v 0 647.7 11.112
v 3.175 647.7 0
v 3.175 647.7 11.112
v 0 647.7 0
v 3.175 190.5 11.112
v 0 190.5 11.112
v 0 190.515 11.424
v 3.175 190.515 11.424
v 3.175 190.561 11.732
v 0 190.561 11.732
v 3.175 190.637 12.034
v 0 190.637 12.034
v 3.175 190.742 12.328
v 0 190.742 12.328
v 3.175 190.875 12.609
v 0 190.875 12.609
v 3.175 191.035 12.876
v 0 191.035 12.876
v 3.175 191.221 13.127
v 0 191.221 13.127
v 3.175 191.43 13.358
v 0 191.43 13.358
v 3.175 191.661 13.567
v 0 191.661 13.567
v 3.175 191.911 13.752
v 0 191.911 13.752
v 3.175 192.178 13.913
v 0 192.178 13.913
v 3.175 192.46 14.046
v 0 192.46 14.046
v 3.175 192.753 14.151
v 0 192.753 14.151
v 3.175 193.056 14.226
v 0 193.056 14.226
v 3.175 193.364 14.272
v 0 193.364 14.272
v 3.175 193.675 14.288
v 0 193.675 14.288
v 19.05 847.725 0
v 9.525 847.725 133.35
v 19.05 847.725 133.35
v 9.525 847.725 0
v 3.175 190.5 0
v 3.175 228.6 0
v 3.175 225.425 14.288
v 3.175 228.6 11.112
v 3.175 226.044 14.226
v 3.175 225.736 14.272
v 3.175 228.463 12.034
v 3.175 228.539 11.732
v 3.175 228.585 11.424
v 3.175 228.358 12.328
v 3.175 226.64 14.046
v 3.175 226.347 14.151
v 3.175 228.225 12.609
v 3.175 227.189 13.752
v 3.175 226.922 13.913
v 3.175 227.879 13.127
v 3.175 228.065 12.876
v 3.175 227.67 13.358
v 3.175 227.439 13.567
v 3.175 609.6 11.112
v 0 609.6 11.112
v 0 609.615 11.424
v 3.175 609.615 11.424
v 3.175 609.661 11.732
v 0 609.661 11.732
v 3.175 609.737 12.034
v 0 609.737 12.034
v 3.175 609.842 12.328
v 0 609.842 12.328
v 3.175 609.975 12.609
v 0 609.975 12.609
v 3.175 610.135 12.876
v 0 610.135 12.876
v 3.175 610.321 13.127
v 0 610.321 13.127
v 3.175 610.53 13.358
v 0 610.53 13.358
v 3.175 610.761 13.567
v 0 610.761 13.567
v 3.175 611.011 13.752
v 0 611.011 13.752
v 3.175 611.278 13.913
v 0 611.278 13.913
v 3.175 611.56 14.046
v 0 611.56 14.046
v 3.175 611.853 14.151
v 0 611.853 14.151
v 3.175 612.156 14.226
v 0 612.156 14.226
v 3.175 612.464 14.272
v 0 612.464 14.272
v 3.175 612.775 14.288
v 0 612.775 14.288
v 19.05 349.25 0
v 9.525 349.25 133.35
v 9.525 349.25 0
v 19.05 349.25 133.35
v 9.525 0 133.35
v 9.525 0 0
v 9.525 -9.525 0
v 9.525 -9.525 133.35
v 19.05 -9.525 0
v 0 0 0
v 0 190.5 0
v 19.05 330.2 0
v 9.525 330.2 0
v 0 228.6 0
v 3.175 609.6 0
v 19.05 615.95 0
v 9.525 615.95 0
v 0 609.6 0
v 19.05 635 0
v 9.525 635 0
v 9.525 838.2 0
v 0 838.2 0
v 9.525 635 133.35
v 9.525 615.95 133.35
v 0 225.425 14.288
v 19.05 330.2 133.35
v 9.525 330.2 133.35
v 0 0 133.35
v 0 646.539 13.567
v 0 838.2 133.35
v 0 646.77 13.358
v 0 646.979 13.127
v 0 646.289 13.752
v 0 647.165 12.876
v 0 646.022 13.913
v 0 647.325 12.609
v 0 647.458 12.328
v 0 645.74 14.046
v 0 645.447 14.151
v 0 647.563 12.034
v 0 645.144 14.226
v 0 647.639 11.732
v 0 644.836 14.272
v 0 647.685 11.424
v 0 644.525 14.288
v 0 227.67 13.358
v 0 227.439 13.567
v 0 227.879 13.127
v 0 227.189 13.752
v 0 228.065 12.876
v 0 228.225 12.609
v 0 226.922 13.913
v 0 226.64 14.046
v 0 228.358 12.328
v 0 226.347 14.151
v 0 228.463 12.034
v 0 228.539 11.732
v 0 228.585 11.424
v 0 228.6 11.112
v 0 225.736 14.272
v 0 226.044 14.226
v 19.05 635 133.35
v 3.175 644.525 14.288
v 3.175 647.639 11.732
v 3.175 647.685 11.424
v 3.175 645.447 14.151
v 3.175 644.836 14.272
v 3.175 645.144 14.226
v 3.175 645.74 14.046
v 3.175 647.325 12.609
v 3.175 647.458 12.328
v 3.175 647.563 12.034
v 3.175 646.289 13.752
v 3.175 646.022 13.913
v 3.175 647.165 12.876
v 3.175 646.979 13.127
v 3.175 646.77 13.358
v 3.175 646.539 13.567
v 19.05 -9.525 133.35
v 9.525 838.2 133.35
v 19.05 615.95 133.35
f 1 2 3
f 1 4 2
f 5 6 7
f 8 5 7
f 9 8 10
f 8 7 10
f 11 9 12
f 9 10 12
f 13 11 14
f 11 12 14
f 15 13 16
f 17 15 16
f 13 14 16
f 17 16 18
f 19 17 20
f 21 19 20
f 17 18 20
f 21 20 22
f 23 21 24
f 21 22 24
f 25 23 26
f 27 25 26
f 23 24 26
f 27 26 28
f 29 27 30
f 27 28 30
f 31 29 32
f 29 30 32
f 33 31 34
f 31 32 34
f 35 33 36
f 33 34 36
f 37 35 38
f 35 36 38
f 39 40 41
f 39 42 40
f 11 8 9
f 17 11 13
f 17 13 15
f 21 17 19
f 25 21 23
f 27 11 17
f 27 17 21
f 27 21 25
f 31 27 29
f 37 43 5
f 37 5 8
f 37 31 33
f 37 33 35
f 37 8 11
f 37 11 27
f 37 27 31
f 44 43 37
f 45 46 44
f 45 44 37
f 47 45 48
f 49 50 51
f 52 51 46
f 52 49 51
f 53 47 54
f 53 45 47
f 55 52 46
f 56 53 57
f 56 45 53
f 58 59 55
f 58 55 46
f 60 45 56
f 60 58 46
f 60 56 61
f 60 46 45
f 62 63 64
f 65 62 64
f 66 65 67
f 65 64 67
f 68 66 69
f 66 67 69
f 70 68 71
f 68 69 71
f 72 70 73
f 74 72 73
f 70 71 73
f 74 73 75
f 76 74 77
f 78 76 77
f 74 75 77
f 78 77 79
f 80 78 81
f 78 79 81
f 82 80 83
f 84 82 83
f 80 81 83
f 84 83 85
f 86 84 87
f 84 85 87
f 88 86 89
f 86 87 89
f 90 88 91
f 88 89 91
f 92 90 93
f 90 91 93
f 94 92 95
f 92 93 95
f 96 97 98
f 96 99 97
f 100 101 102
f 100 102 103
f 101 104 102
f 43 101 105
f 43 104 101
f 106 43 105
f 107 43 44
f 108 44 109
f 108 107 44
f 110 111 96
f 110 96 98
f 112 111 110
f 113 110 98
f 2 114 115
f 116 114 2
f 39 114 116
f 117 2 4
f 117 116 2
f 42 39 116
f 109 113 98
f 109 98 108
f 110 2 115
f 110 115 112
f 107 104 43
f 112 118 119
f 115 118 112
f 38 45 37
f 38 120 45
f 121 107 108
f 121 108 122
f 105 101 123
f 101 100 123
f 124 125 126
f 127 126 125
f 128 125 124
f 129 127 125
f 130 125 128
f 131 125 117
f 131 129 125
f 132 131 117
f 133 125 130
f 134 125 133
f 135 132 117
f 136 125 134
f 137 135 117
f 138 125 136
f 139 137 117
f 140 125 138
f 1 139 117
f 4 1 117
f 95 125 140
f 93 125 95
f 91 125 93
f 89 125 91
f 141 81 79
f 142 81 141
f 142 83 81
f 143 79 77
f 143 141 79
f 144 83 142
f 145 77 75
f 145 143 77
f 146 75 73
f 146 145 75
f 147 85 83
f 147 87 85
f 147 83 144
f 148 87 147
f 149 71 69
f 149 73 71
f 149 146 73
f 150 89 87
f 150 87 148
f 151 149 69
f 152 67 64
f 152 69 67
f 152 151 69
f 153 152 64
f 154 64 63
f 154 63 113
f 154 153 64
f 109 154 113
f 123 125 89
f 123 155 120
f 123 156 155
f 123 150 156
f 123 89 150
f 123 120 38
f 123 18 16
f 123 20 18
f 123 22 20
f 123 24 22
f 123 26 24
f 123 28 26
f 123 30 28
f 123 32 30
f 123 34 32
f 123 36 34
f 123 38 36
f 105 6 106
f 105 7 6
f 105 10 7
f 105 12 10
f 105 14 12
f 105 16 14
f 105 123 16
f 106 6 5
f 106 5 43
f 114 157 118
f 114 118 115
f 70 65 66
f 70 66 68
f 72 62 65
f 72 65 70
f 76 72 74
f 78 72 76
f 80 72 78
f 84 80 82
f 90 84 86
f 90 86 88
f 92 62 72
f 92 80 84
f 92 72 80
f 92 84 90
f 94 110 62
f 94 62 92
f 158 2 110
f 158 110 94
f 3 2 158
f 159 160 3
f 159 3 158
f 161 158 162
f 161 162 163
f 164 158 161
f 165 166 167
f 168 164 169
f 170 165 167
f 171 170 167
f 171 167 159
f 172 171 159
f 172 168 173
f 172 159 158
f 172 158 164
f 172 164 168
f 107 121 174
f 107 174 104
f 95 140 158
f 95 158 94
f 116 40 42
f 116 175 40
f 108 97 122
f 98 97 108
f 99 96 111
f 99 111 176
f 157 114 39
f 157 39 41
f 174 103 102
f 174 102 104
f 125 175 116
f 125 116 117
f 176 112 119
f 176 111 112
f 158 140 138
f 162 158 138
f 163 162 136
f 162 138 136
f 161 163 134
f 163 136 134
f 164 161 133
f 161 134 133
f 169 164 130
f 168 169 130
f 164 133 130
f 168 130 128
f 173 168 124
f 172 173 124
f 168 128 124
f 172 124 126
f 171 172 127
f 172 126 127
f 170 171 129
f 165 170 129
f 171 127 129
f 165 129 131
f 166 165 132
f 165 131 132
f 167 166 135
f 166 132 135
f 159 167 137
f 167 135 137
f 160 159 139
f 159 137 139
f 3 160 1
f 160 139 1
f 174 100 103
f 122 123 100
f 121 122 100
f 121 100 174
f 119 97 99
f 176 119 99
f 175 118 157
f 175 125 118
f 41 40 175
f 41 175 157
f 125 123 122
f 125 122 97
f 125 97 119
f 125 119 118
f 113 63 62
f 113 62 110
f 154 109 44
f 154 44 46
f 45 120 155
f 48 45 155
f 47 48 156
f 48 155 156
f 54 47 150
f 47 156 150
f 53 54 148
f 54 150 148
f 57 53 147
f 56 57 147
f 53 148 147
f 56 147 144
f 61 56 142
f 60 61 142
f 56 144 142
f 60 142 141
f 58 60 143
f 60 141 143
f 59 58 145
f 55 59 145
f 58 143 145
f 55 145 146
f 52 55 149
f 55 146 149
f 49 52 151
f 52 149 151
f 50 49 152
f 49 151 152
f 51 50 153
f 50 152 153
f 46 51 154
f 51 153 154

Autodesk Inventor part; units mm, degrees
ref_plane "YZ Plane" through (0, 0, 0) normal (1, 0, 0) x (0, 1, 0)
ref_plane "XZ Plane" through (0, 0, 0) normal (0, 1, 0) x (-1, 0, 0)
ref_plane "XY Plane" through (0, 0, 0) normal (0, 0, 1) x (1, 0, 0)
sketch "Sketch1" plane through (0, 0, 0) normal (0, 1, 0) x (-1, 0, 0)
  line L0 (0, 0) -> (-19.05, 0)
  line L1 (-19.05, 0) -> (-19.05, 133.35)
  line L2 (-19.05, 133.35) -> (0, 133.35)
  line L3 (0, 133.35) -> (0, 0)
  dimension "d0" = 19.05
  dimension "d1" = 133.35
extrude "Board" add sketch "Sketch1" along normal blind 838.2
sketch "Sketch2" plane through (19.05, 0, 133.35) normal (1, 0, 0) x (0, 0, -1)
  line L0 (0, 349.25) -> (133.35, 349.25)
  line L1 (133.35, 349.25) -> (133.35, 330.2)
  line L2 (133.35, 330.2) -> (0, 330.2)
  line L3 (0, 330.2) -> (0, 349.25)
  line L4 (0, 0) -> (133.35, 0) projected
  line L5 (0, 0) -> (0, 838.2) projected
  line L6 (133.35, 0) -> (133.35, 838.2) projected
  line L7 (0, 635) -> (133.35, 635)
  line L8 (133.35, 635) -> (133.35, 615.95)
  line L9 (133.35, 615.95) -> (0, 615.95)
  line L10 (0, 615.95) -> (0, 635)
  line L11 (0, 838.2) -> (133.35, 838.2) projected
  dimension "d4" = 19.05
  dimension "d5" = 330.2
  dimension "d9" = 19.05
  dimension "d13" = 203.2
  dimension "d14" = 266.7
extrude "Extrusion2" cut sketch "Sketch2" against normal blind 9.525 contours L0 L1 L2 L3 | L5 L7 L6 L9
sketch "Sketch3" plane through (0, 838.2, 0) normal (0, 1, 0) x (1, 0, 0)
  line L0 (0, -133.35) -> (19.05, -133.35) projected
  line L1 (19.05, -133.35) -> (9.525, -133.35)
  line L2 (9.525, -133.35) -> (9.525, 0)
  line L3 (9.525, 0) -> (19.05, 0)
  line L4 (19.05, 0) -> (19.05, -133.35)
  line L5 (19.05, 0) -> (0, 0) projected
  dimension "d15" = 9.525
extrude "Extrusion3" add sketch "Sketch3" along normal blind 9.525
sketch "Sketch4" plane through (0, 0, 0) normal (0, -1, 0) x (1, 0, 0)
  line L0 (19.05, 0) -> (9.525, 0)
  line L1 (9.525, 0) -> (9.525, 133.35)
  line L2 (9.525, 133.35) -> (19.05, 133.35)
  line L3 (19.05, 133.35) -> (19.05, 0)
  line L4 (19.05, 0) -> (19.05, 133.35) projected
  line L5 (0, 0) -> (19.05, 0) projected
  line L6 (19.05, 133.35) -> (0, 133.35) projected
  dimension "d18" = 9.525
extrude "Extrusion4" add sketch "Sketch4" along normal blind 9.525
sketch "Sketch5" plane through (0, 0, 0) normal (-1, 0, 0) x (0, 0, 1)
  line L0 (0, 647.7) -> (11.1125, 647.7)
  line L1 (14.2875, 644.525) -> (14.2875, 612.775)
  line L2 (11.1125, 609.6) -> (0, 609.6)
  line L3 (0, 609.6) -> (0, 647.7)
  line L4 (0, 228.6) -> (11.1125, 228.6)
  line L5 (14.2875, 225.425) -> (14.2875, 193.675)
  line L6 (11.1125, 190.5) -> (0, 190.5)
  line L7 (0, 190.5) -> (0, 228.6)
  line L8 (0, 0) -> (0, 838.2) projected
  line L9 (133.35, 838.2) -> (0, 838.2) projected
  arc A0 (11.1125, 609.6) -> (14.2875, 612.775) centre (11.1125, 612.775) ccw
  arc A1 (14.2875, 644.525) -> (11.1125, 647.7) centre (11.1125, 644.525) ccw
  arc A2 (11.1125, 190.5) -> (14.2875, 193.675) centre (11.1125, 193.675) ccw
  arc A3 (14.2875, 225.425) -> (11.1125, 228.6) centre (11.1125, 225.425) ccw
  point P0 (14.2875, 609.6)
  point P1 (14.2875, 647.7)
  point P2 (14.2875, 190.5)
  point P3 (14.2875, 228.6)
  dimension "d21" = 14.2875
  dimension "d22" = 38.1
  dimension "d23" = 14.2875
  dimension "d24" = 38.1
  dimension "d25" = 190.5
  dimension "d26" = 838.2
  dimension "d27" = 381
  dimension "d28" = 3.175
extrude "Extrusion5" cut sketch "Sketch5" against normal blind 3.175
equation "\"d9\" = d4"
equation "\"d23\" = d21"
equation "\"d24\" = d22"
equation "\"d25\" = 0.25 * d26 - 0.5 * d22"
equation "\"d27\" = 2 * d25"
properties part number "Door Side" material "Wood (Oak)"
